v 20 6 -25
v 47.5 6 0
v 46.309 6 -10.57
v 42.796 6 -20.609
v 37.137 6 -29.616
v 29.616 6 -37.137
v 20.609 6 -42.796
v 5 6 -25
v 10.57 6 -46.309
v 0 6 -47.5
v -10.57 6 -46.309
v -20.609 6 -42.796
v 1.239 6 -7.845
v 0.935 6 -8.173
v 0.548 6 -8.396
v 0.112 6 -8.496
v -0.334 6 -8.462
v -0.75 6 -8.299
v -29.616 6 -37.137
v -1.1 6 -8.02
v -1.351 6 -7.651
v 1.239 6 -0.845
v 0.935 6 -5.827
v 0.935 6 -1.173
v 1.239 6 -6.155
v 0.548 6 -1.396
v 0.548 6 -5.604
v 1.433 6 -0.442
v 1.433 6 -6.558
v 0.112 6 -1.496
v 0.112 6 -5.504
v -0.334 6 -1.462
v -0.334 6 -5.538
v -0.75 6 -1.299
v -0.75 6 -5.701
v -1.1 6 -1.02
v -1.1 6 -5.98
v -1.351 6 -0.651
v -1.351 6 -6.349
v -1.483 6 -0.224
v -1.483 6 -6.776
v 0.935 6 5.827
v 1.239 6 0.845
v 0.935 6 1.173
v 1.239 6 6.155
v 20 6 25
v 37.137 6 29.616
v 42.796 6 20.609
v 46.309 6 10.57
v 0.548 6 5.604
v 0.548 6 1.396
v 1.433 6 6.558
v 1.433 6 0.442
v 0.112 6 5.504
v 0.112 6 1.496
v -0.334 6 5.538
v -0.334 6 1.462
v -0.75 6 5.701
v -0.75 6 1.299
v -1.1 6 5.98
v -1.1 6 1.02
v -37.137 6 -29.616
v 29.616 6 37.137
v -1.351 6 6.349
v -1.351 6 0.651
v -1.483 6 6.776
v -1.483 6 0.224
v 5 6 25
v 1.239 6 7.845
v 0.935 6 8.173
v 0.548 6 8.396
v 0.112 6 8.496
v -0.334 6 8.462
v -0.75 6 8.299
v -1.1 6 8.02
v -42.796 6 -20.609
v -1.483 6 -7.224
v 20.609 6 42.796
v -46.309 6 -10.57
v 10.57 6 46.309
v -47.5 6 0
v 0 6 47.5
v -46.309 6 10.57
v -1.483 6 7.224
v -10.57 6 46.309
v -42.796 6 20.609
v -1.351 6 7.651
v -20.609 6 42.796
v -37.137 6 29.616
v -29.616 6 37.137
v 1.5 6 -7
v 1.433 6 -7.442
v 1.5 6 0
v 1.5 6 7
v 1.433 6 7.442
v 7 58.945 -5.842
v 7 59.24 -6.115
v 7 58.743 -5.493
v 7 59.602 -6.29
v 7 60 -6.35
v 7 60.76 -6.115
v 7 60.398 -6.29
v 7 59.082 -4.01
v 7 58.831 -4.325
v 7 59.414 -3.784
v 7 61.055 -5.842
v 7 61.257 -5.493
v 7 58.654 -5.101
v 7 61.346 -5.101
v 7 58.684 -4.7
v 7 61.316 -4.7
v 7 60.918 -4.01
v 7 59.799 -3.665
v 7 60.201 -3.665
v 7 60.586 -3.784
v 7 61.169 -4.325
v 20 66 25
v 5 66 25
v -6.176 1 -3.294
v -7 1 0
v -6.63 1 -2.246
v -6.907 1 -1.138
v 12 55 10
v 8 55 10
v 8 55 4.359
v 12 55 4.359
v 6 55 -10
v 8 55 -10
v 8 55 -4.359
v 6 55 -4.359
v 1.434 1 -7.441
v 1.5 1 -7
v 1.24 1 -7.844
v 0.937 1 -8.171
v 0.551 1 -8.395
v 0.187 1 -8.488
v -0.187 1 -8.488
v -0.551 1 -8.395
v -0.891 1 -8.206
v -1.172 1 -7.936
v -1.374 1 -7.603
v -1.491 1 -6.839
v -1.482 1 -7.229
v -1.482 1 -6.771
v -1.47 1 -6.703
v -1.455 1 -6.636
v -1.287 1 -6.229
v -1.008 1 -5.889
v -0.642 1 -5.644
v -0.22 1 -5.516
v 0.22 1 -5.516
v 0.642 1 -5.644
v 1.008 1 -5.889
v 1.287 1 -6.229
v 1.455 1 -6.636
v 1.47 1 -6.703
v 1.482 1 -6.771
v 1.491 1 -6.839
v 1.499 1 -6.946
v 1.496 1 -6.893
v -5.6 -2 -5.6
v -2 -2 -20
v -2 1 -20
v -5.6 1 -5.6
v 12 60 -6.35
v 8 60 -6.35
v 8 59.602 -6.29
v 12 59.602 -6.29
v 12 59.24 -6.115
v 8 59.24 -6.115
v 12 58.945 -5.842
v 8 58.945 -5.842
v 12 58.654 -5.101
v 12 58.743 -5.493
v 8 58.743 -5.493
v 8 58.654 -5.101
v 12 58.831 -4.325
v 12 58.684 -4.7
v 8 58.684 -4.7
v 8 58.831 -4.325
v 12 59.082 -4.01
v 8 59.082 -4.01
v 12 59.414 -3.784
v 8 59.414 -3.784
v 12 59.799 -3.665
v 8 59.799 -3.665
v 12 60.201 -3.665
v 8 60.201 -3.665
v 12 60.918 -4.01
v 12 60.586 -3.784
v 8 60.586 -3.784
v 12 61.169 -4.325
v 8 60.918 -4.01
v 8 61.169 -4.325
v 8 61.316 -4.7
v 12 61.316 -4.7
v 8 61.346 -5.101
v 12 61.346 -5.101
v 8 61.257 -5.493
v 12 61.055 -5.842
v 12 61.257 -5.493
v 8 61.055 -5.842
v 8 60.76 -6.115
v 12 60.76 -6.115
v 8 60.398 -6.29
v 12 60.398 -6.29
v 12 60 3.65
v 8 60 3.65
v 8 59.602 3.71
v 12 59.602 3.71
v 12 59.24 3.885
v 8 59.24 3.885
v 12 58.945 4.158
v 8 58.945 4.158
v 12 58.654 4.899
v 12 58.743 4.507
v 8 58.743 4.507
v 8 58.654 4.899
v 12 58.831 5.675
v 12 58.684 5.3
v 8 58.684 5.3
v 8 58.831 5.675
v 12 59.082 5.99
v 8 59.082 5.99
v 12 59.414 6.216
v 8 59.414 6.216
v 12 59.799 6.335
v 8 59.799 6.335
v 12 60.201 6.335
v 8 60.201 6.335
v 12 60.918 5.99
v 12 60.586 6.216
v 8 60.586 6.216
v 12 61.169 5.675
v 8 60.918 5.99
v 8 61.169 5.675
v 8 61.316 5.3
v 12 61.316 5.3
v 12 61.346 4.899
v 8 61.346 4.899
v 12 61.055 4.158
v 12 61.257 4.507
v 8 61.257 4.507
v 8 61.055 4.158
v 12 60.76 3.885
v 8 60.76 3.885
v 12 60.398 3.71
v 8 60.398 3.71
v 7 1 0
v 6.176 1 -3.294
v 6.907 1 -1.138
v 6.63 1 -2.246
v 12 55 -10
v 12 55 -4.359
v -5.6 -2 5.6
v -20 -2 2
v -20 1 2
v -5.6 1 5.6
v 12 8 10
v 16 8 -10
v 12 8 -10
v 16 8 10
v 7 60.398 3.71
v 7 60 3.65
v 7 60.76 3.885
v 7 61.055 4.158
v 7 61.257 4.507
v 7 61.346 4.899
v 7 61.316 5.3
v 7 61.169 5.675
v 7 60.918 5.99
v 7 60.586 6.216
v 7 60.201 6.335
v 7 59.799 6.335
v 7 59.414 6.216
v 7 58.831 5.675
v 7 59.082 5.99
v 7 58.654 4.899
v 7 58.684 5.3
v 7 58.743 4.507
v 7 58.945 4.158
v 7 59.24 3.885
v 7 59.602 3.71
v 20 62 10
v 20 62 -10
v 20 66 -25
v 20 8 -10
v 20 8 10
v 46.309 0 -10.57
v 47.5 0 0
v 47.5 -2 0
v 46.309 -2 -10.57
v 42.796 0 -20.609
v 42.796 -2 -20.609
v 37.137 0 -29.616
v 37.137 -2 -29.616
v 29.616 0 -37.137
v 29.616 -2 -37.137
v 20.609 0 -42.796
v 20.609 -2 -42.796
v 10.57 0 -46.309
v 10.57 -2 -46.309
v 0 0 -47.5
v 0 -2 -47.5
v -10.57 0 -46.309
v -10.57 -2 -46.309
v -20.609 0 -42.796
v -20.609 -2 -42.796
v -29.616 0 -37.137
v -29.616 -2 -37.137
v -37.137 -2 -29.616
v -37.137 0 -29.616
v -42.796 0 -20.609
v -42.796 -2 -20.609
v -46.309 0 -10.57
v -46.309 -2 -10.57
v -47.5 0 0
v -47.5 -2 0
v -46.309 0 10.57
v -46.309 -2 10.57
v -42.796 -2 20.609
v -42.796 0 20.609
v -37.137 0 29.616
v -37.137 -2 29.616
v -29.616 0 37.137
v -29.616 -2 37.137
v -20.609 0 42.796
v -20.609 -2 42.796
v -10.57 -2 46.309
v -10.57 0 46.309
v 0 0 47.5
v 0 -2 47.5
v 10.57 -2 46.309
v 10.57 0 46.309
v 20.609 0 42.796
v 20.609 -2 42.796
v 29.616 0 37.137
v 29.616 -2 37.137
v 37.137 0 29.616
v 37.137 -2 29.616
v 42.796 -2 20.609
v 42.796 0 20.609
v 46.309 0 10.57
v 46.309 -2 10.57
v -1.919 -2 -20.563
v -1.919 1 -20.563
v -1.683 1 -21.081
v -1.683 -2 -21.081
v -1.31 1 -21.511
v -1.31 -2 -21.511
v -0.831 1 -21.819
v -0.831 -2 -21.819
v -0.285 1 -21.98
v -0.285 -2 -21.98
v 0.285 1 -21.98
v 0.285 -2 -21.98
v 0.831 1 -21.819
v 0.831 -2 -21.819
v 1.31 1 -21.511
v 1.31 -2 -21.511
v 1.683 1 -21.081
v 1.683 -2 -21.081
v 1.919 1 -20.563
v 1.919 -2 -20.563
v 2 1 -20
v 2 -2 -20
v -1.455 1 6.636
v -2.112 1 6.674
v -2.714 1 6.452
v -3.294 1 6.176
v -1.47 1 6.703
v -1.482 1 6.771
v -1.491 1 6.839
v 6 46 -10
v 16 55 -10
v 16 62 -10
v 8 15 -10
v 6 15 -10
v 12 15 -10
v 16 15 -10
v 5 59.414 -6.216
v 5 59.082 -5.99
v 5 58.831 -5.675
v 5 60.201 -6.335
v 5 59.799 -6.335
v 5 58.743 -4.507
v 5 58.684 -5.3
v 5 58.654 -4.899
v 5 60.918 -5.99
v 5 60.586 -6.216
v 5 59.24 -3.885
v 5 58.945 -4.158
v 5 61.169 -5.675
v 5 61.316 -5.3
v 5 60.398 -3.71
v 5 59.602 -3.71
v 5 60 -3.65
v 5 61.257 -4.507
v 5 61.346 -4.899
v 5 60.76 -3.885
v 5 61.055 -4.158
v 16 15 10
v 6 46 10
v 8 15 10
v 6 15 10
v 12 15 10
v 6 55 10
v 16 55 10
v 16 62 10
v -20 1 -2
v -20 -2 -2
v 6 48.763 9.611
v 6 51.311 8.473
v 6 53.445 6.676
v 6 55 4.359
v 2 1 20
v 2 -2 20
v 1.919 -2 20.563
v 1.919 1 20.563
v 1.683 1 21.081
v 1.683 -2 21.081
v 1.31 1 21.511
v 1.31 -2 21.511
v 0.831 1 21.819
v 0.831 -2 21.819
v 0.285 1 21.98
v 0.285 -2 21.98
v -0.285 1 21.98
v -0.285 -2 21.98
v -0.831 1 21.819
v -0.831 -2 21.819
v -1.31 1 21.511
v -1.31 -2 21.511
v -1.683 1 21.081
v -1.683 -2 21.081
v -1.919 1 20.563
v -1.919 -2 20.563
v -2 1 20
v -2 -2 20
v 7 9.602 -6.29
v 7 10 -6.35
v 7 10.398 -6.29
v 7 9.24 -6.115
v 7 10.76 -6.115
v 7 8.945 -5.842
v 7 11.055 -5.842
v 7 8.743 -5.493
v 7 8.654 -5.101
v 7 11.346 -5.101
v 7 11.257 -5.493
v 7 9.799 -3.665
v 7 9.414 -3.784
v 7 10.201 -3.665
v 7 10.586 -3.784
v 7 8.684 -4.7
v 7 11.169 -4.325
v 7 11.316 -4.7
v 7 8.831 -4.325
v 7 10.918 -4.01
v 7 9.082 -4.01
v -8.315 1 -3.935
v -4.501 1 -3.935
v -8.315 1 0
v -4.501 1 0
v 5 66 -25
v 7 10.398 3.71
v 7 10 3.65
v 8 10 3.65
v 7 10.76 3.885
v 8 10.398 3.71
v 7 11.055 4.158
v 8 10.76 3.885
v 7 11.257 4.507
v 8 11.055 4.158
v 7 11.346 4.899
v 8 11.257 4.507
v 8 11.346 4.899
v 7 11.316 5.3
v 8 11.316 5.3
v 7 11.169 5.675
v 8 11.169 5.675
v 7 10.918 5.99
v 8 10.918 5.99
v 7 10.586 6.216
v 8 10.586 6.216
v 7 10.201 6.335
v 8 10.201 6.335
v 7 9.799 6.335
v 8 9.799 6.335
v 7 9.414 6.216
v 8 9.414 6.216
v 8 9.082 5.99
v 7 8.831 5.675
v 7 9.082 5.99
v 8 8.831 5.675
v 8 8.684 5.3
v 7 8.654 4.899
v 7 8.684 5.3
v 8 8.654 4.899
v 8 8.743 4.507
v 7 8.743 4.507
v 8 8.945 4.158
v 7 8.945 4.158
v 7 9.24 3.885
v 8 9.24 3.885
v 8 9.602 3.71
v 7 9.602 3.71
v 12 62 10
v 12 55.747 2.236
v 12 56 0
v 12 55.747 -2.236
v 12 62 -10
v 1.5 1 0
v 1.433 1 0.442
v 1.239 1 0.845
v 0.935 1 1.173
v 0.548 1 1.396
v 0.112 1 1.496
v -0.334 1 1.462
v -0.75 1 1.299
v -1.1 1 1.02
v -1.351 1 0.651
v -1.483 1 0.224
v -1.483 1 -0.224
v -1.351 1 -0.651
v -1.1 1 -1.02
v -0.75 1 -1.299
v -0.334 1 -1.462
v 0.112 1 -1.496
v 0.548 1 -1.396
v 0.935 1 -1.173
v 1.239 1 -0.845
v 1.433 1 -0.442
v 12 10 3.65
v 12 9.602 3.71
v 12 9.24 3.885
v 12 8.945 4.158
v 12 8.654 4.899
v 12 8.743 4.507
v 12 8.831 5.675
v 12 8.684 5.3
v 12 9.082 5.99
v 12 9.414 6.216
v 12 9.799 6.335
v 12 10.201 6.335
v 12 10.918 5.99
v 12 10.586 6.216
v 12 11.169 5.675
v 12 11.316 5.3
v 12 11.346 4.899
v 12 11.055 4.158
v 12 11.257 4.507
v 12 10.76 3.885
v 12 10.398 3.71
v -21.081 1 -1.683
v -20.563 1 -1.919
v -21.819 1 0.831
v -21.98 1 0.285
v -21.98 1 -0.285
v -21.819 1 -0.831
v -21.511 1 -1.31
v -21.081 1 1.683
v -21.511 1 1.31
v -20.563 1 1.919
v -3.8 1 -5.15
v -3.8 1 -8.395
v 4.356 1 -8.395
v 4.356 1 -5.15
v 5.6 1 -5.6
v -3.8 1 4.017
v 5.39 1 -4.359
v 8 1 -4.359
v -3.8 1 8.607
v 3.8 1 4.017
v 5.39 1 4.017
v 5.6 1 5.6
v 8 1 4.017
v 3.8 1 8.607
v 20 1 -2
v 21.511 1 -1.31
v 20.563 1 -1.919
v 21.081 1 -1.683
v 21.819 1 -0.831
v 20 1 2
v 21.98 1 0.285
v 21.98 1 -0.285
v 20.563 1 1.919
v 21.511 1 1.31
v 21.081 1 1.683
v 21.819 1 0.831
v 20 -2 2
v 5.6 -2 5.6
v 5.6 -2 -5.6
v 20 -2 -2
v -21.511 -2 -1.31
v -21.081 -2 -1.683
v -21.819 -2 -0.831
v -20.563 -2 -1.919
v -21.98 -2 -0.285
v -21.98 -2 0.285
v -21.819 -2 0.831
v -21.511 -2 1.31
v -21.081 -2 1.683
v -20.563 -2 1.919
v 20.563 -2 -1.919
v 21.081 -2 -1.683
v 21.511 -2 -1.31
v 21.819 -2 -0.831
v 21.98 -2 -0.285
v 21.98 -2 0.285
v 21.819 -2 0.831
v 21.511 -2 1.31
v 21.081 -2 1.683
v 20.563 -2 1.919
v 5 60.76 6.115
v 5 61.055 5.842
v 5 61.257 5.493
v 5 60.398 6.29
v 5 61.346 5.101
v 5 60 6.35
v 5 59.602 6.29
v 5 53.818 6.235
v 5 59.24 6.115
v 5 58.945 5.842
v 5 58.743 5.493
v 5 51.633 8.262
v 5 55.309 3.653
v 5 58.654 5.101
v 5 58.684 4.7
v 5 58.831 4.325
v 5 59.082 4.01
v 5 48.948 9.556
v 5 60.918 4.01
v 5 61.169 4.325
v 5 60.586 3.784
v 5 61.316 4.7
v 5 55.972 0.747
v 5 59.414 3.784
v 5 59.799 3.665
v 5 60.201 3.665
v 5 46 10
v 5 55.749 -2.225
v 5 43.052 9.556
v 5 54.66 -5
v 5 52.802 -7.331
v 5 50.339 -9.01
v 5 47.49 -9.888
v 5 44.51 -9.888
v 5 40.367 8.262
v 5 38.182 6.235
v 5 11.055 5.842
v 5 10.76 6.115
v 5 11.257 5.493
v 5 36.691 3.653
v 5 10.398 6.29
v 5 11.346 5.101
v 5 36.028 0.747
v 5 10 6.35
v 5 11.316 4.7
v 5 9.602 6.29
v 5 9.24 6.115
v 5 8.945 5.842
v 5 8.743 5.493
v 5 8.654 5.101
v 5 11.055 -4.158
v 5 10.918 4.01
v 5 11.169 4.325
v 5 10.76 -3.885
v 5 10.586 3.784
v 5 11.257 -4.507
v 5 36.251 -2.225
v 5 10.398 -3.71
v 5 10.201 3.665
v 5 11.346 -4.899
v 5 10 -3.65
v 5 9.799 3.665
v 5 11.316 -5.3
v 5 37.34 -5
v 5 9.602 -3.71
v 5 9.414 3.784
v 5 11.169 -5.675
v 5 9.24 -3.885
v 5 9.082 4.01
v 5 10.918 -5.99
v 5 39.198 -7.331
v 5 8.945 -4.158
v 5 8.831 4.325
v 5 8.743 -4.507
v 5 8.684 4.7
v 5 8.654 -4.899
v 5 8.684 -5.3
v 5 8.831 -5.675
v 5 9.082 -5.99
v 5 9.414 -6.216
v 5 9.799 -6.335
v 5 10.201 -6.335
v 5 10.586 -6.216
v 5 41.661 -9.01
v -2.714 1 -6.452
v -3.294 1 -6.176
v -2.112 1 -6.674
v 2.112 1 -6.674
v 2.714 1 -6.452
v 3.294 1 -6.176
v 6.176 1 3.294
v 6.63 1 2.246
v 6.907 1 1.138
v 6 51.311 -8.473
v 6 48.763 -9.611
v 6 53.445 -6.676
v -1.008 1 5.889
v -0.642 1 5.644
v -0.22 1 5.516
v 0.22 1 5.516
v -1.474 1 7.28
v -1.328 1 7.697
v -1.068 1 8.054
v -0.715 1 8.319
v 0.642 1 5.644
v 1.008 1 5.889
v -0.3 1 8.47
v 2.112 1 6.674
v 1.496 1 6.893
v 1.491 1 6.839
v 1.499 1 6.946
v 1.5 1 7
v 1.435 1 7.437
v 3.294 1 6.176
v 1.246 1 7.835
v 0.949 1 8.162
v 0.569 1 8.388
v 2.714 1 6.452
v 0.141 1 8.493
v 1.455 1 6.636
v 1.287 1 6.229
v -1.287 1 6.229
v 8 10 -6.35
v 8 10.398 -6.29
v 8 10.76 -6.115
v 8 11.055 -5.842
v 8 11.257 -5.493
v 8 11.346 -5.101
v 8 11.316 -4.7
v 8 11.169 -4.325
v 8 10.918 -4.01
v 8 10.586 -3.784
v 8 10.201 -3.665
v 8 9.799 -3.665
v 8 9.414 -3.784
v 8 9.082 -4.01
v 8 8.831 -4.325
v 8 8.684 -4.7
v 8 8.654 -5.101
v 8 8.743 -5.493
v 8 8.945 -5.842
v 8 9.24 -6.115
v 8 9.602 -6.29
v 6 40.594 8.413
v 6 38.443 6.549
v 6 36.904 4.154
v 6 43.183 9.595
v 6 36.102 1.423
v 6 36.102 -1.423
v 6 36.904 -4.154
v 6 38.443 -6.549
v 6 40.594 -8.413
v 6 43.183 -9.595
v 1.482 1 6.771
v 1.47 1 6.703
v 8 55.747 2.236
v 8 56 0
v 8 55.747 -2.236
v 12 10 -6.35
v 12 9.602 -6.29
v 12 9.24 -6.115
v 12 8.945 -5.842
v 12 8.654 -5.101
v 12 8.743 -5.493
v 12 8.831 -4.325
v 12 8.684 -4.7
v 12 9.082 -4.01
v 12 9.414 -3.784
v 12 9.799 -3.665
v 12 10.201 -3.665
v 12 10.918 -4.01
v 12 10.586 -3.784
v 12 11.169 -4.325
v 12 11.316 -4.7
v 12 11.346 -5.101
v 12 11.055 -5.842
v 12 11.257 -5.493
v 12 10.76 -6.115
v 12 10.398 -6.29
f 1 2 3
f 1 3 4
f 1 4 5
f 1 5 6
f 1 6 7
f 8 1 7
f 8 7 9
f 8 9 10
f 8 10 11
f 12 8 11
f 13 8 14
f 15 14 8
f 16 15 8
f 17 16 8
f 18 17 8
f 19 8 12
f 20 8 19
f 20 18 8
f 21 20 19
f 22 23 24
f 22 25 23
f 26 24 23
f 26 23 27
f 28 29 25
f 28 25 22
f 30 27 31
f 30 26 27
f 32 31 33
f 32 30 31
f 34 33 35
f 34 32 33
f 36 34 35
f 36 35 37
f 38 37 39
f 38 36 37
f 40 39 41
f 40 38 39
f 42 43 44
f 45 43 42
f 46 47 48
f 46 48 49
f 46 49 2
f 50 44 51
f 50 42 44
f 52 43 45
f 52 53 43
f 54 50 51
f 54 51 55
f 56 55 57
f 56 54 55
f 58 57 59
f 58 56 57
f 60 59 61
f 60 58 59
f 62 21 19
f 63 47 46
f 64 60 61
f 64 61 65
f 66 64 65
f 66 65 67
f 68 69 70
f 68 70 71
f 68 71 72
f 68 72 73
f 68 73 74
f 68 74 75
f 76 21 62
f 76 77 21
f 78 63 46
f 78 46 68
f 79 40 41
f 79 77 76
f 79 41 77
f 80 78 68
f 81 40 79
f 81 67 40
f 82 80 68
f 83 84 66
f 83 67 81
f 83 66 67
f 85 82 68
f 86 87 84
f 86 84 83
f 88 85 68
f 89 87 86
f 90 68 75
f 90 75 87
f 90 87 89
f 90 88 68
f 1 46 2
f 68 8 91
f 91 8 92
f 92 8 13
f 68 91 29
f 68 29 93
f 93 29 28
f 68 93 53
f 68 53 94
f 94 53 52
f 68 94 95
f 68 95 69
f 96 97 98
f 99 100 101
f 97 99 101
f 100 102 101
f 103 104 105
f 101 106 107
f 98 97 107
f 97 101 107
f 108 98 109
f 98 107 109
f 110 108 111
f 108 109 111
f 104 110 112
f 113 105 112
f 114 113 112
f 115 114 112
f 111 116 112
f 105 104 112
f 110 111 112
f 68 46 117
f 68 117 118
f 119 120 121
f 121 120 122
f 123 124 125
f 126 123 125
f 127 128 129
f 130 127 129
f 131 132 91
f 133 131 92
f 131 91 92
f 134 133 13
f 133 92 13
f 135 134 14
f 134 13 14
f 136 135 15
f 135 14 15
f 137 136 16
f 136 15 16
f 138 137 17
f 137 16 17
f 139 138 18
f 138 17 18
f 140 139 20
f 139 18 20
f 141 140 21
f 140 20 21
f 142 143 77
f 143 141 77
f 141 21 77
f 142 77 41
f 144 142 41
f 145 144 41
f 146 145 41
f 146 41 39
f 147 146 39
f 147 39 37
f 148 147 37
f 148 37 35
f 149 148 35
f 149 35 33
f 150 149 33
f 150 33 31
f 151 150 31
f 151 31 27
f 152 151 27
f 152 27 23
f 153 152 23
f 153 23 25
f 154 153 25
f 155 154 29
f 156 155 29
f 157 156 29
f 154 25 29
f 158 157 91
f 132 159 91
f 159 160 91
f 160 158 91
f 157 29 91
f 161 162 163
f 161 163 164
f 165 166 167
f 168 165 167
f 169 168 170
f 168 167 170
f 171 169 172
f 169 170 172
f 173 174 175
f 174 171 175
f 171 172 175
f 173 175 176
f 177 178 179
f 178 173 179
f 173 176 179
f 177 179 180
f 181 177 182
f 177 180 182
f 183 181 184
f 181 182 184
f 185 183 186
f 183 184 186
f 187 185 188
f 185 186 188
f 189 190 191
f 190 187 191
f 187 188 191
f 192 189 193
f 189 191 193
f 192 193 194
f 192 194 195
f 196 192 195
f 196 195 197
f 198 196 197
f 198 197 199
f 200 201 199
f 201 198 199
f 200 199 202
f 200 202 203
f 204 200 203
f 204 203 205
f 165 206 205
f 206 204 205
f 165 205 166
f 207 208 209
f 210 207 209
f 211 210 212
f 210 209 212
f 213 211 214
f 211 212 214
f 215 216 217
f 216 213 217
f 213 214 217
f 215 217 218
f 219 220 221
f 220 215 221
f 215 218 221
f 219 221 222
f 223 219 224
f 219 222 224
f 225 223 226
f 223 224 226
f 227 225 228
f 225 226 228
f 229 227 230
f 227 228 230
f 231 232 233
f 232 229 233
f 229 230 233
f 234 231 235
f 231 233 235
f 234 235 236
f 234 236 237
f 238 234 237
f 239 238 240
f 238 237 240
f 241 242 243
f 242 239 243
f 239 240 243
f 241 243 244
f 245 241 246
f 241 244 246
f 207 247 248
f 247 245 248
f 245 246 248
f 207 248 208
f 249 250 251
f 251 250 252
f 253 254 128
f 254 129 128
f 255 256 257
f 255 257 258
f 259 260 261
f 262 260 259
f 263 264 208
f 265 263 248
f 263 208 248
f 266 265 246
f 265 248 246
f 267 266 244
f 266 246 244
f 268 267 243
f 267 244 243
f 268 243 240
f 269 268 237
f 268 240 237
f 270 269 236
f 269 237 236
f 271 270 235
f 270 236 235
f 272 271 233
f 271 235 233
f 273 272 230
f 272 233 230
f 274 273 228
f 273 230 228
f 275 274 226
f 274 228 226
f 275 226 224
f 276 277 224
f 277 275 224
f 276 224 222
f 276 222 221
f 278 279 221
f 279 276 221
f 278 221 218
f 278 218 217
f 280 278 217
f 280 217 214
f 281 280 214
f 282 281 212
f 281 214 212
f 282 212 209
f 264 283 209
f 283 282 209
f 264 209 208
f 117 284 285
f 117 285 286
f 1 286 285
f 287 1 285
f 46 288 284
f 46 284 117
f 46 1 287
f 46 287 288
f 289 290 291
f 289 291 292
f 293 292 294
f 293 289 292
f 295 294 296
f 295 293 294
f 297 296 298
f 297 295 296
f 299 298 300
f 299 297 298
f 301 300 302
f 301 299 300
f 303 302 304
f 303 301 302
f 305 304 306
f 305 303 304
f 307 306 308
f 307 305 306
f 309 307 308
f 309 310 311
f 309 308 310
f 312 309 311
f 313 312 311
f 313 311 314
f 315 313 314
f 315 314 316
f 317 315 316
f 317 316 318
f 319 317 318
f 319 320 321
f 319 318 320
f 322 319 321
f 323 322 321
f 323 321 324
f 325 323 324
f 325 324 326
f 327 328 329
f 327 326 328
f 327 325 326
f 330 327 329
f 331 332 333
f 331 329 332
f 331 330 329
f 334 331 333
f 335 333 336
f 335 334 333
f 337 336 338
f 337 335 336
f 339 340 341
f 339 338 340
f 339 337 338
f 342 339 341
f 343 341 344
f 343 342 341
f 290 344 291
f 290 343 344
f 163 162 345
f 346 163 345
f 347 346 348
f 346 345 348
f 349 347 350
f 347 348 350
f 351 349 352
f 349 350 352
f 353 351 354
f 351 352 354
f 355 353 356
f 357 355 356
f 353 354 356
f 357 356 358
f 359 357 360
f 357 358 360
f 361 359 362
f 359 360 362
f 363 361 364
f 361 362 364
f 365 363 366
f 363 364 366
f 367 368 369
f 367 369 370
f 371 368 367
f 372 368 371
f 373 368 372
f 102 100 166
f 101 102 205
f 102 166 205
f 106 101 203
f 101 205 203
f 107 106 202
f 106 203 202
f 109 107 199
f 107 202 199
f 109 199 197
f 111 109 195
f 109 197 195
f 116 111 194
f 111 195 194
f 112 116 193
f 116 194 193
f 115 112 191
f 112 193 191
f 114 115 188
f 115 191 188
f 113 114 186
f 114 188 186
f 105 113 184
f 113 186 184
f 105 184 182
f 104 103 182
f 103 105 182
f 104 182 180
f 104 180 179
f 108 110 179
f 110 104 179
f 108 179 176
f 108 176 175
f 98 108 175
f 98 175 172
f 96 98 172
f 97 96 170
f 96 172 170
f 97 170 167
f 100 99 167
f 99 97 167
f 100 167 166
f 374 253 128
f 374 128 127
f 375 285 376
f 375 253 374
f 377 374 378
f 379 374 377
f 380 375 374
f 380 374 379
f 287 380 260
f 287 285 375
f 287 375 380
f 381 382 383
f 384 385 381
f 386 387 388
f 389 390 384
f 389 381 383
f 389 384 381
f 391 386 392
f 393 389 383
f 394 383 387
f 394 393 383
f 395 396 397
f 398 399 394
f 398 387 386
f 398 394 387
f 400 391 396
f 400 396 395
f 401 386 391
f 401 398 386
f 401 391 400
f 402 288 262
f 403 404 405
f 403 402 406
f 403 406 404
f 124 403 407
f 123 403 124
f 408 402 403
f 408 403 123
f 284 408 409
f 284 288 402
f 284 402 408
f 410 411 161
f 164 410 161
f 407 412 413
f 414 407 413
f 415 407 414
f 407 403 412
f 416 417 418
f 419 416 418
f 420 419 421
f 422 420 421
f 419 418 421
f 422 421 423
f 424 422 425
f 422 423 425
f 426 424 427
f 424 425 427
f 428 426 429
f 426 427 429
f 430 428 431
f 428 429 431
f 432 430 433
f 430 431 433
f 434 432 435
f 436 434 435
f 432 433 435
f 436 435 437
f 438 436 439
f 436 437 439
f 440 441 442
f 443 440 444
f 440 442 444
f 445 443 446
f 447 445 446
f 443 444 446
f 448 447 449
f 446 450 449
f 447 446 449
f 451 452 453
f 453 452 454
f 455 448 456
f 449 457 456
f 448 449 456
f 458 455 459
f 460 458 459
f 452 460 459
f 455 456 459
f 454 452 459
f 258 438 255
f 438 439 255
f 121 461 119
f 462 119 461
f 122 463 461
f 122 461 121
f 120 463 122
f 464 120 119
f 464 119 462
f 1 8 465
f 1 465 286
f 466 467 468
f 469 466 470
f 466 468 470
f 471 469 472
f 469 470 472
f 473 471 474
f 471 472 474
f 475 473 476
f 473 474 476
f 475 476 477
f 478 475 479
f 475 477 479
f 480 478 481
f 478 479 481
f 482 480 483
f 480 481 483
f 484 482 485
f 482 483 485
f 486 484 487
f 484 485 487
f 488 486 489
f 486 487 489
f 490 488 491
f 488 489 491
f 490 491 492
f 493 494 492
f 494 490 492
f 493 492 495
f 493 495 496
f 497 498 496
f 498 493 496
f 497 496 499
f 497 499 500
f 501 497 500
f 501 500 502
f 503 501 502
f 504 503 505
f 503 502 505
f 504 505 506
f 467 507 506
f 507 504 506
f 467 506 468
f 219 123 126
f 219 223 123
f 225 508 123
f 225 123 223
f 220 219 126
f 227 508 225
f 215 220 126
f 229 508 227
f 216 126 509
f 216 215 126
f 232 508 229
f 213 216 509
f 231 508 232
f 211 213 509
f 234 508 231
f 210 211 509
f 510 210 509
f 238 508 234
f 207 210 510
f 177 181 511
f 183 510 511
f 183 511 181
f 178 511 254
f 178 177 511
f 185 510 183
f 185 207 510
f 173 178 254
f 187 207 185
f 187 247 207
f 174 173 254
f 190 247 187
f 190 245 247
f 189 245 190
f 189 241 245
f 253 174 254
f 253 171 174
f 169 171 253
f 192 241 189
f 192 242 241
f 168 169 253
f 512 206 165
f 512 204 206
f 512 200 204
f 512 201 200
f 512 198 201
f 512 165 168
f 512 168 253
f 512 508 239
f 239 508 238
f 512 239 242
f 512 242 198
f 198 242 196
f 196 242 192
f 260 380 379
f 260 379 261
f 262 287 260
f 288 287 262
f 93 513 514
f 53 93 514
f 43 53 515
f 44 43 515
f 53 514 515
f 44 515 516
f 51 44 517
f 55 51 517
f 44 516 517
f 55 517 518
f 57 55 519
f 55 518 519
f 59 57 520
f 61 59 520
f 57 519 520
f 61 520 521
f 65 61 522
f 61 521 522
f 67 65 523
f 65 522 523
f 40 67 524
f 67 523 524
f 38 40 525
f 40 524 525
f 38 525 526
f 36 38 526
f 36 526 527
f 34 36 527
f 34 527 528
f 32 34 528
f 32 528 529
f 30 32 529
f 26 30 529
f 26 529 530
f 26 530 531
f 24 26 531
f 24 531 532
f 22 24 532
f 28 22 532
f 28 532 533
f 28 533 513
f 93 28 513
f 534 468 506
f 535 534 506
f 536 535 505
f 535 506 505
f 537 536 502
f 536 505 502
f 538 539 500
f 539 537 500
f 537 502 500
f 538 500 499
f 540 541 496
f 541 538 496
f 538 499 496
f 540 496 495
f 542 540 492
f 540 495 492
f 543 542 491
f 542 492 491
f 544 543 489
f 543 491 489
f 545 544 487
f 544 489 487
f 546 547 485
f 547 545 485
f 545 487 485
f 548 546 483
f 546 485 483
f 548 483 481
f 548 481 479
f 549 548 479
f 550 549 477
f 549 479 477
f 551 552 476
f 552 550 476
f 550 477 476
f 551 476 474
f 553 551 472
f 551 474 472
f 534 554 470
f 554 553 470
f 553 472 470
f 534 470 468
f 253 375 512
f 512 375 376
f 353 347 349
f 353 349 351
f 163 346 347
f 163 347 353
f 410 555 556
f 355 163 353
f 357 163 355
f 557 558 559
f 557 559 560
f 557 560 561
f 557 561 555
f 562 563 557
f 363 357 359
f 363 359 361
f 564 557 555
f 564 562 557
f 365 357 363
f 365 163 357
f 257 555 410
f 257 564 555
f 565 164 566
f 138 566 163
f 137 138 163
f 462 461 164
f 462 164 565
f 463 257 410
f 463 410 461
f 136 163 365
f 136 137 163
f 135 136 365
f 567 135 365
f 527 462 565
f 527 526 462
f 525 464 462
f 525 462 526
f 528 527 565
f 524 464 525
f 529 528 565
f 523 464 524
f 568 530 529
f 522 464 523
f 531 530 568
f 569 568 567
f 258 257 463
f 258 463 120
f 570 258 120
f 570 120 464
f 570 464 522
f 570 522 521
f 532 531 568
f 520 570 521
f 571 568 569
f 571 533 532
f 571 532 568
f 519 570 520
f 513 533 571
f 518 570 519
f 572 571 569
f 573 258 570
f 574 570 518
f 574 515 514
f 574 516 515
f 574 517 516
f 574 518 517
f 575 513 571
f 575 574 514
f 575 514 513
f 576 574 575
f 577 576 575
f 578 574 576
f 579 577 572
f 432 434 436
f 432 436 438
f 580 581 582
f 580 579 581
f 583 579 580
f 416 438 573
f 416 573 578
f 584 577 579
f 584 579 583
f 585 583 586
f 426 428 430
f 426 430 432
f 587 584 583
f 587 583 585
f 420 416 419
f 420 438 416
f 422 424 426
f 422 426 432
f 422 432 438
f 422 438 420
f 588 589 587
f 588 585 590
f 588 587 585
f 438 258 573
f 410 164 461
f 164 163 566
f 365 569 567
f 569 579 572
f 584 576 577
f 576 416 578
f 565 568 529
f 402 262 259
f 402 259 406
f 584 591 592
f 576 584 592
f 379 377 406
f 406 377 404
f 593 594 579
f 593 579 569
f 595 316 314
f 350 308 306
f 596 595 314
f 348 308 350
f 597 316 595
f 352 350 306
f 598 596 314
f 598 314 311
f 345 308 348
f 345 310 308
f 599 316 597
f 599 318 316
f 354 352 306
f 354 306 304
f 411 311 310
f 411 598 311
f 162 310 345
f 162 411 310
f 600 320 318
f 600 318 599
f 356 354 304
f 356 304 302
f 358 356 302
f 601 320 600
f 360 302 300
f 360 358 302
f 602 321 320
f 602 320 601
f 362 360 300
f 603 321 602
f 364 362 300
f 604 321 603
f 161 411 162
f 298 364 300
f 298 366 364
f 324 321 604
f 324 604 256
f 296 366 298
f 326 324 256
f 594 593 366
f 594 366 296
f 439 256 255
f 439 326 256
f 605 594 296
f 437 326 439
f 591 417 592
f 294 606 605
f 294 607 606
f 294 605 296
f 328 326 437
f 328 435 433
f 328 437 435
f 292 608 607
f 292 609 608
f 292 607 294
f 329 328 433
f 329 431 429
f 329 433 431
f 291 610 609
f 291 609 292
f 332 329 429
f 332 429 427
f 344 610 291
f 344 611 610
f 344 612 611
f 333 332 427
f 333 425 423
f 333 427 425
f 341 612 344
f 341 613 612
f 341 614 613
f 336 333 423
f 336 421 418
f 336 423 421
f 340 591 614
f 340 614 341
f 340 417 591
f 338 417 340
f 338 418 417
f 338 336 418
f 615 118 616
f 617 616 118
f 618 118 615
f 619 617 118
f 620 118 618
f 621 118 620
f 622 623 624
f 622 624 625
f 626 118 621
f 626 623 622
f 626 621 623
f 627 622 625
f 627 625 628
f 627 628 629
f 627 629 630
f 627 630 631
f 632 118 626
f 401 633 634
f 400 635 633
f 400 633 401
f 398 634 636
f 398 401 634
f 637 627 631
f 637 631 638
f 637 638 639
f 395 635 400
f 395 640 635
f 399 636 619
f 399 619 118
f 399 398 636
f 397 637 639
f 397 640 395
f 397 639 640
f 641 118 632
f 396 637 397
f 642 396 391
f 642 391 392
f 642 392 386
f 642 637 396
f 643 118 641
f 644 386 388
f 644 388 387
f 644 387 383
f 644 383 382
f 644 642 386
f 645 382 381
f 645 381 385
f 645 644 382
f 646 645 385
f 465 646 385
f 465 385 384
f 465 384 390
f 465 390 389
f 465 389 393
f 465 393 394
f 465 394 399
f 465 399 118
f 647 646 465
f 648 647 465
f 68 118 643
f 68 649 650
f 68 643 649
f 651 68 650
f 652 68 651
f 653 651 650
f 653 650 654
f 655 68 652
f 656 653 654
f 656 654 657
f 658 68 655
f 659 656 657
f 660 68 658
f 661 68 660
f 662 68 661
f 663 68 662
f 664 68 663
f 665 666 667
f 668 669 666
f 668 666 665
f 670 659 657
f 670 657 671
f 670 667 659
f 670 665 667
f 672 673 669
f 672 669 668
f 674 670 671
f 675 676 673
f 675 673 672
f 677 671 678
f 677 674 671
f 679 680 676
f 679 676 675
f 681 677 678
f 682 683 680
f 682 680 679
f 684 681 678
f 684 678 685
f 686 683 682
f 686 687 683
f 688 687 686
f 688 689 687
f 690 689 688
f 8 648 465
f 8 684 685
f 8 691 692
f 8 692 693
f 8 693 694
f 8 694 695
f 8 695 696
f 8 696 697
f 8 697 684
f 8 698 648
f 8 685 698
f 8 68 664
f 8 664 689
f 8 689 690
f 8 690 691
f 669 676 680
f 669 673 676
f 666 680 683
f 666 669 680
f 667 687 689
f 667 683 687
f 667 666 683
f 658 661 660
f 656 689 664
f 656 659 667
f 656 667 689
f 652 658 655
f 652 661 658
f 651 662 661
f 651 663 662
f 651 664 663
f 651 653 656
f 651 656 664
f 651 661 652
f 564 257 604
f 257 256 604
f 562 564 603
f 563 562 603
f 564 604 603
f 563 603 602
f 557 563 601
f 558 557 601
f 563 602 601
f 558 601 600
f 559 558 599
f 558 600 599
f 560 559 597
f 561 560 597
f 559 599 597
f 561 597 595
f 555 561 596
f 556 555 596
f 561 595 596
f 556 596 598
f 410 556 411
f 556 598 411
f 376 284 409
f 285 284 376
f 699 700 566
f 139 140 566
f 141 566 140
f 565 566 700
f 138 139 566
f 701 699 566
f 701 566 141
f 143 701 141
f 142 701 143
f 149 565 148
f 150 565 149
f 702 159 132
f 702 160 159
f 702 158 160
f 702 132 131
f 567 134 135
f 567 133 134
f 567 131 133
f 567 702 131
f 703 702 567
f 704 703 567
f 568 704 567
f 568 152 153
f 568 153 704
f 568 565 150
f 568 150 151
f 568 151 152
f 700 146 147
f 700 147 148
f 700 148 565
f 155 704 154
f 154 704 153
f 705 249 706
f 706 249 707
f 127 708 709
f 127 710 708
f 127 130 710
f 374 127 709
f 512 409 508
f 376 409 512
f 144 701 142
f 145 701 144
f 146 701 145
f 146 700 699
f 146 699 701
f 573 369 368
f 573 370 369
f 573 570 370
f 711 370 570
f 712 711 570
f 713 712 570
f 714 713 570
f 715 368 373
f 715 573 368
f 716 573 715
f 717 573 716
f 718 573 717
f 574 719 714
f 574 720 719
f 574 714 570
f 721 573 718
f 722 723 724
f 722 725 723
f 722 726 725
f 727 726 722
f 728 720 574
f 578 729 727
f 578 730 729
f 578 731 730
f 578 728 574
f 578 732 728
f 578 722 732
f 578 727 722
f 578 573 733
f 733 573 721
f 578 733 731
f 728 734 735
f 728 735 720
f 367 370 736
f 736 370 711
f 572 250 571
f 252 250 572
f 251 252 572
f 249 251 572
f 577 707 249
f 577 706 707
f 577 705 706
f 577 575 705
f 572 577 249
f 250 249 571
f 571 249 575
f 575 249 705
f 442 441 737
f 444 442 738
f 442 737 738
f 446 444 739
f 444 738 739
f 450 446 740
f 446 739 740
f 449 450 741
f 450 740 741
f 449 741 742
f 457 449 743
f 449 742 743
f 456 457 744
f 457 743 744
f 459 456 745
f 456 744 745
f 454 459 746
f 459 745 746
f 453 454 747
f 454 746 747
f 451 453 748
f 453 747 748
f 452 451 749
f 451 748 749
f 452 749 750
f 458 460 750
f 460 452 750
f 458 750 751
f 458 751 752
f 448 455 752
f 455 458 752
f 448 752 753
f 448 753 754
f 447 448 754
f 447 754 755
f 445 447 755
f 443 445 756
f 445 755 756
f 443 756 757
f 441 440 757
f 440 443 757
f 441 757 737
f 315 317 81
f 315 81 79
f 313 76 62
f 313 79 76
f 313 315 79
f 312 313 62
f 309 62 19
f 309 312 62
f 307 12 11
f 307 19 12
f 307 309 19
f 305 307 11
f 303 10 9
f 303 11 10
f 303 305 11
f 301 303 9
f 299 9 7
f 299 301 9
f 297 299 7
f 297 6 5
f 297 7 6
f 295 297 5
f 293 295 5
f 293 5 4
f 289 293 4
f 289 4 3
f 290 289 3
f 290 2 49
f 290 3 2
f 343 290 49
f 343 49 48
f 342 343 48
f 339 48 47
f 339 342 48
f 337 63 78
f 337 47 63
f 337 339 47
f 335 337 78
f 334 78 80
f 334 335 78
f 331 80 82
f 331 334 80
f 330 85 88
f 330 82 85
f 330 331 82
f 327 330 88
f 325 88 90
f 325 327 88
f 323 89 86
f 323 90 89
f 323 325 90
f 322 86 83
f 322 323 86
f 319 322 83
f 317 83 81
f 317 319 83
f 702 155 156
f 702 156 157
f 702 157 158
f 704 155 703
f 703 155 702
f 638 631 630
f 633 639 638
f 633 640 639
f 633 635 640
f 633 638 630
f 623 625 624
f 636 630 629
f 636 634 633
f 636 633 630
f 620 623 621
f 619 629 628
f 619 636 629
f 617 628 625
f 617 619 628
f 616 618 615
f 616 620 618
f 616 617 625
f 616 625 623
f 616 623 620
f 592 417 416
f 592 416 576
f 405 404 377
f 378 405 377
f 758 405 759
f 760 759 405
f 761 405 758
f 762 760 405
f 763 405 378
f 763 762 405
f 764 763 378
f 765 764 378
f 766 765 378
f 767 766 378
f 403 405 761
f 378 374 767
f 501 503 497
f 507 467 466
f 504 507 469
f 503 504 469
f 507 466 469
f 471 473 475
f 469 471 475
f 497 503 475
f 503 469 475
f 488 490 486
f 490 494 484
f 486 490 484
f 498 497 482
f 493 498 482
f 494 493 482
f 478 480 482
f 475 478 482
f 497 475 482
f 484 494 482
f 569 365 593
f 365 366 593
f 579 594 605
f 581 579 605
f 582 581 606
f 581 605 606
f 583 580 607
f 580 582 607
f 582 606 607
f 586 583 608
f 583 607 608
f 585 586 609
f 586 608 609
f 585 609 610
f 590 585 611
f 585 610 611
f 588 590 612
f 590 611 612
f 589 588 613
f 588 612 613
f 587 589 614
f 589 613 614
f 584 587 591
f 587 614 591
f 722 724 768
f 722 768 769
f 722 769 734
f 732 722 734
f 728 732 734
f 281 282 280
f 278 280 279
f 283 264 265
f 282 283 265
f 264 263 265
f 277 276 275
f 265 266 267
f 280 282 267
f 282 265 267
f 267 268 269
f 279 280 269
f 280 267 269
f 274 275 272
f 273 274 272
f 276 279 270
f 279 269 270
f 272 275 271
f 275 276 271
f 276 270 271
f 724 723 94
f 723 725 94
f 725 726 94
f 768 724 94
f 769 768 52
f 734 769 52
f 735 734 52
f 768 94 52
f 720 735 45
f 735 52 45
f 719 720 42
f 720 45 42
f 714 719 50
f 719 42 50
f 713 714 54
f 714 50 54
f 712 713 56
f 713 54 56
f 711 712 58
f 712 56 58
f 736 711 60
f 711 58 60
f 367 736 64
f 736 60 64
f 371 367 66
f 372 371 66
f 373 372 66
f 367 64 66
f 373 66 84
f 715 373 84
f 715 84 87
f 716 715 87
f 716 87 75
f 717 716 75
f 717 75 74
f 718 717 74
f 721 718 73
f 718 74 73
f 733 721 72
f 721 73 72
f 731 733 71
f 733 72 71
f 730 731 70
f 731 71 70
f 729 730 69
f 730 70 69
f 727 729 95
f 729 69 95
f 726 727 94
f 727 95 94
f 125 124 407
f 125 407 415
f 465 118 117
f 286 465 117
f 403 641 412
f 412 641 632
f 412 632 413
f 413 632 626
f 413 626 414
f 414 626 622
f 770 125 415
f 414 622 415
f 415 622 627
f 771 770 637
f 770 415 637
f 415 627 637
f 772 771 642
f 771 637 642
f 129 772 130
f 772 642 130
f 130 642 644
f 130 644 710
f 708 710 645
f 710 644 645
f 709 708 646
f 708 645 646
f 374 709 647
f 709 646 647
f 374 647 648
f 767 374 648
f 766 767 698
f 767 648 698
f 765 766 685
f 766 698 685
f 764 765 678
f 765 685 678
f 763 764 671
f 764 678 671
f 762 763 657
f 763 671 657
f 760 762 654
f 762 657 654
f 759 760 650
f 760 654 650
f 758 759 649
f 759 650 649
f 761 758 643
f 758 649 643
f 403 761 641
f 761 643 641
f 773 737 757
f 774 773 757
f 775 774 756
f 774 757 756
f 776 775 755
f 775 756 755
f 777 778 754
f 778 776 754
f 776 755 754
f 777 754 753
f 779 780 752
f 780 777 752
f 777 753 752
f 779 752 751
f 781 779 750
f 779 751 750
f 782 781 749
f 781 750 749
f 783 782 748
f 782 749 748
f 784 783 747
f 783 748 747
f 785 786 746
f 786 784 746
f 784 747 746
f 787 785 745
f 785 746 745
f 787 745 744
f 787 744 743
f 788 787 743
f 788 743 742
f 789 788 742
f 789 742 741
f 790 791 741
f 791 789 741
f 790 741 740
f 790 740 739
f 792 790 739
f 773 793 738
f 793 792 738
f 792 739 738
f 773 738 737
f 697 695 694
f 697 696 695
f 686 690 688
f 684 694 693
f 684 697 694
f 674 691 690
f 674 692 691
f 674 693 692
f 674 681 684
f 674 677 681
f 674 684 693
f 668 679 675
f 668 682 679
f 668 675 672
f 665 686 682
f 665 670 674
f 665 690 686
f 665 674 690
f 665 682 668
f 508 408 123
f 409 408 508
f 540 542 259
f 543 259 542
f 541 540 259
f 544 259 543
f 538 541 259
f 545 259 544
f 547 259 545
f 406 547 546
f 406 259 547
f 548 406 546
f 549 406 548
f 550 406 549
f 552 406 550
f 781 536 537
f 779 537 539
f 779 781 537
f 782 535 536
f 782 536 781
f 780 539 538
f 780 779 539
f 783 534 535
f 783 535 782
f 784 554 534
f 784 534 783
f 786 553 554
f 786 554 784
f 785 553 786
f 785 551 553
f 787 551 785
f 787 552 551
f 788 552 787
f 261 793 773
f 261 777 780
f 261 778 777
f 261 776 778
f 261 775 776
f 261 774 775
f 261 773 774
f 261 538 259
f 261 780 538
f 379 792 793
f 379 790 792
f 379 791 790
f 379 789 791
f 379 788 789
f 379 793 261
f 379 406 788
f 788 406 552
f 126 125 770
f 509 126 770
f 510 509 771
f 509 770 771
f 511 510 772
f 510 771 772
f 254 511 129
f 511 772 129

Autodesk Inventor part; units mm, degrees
ref_plane "YZ Plane" through (0, 0, 0) normal (1, 0, 0) x (0, 1, 0)
ref_plane "XZ Plane" through (0, 0, 0) normal (0, 1, 0) x (-1, 0, 0)
ref_plane "XY Plane" through (0, 0, 0) normal (0, 0, 1) x (1, 0, 0)
sketch "Sketch1" plane through (0, 0, 0) normal (0, 1, 0) x (-1, 0, 0)
  circle A0 centre (0, 0) radius 47.5
  dimension "d0" = 95
extrude "Extrusion1" add sketch "Sketch1" along normal blind 6
sketch "Sketch2" plane through (0, 6, 0) normal (0, 1, 0) x (1, 0, 0)
  circle A0 centre (0, 0) radius 7
  circle A1 centre (0, -7) radius 1.5
  circle A2 centre (0, 7) radius 1.5
  dimension "d3" = 14
  dimension "d4" = 3
  dimension "d5" = 3
extrude "Extrusion2" cut sketch "Sketch2" against normal blind 6 contours A2 A0 | A0 A2 | A1 A0 | A0 A1
sketch "Sketch3" plane through (0, 6, 0) normal (0, 1, 0) x (1, 0, 0)
  line L0 (0, 0) -> (5, 0)
  line L1 (5, 0) -> (5, -10)
  line L2 (5, -10) -> (0, -10)
  line L3 (0, -10) -> (0, 0)
  line L4 (5, 0) -> (0, 0)
  line L5 (0, 0) -> (0, 10)
  line L6 (0, 10) -> (5, 10)
  line L7 (5, 10) -> (5, 0)
  line L8 (5, 0) -> (20, 0)
  line L9 (20, 0) -> (20, -25)
  line L10 (20, -25) -> (5, -25)
  line L11 (5, -25) -> (5, 0)
  line L12 (20, 0) -> (5, 0)
  line L13 (5, 0) -> (5, 25)
  line L14 (5, 25) -> (20, 25)
  line L15 (20, 25) -> (20, 0)
  dimension "d8" = 5
  dimension "d9" = 10
  dimension "d10" = 10
  dimension "d11" = 15
  dimension "d12" = 25
  dimension "d13" = 25
extrude "Extrusion3" add sketch "Sketch3" along normal blind 60 contours L8 L9 L10 L11 L1 | L7 L13 L14 L15 L8
sketch "Sketch4" plane through (5, 6, -25) normal (-1, 0, 0) x (0, 0, 1)
  line L0 (50, 0) -> (50, 60) projected
  line L1 (50, 0) -> (48, 0)
  line L2 (48, 0) -> (48, 40)
  line L3 (48, 40) -> (50, 40)
  line L4 (50, 40) -> (50, 0)
  circle A0 centre (25, 40) radius 10
  point P0 (25, -6)
  dimension "d16" = 2
  dimension "d17" = 40
  dimension "d18" = 20
extrude "Extrusion4" cut sketch "Sketch4" against normal blind 20 contours A0
sketch "Sketch5" plane through (20, 6, 25) normal (1, 0, 0) x (0, 0, -1)
  circle A0 centre (25, 40) radius 10 projected
  line L0 (25, 40) -> (30, 40)
  line L1 (30, 40) -> (30, 4)
  line L2 (30, 4) -> (25, 4)
  line L3 (25, 4) -> (25, 40)
  line L4 (25, 40) -> (20, 40)
  line L5 (20, 40) -> (20, 4)
  line L6 (20, 4) -> (25, 4)
  line L7 (25, 4) -> (25, 40)
  circle A1 centre (20, 4) radius 1.35
  circle A2 centre (30, 4) radius 1.35
  point P0 (25, -6)
  dimension "d21" = 5
  dimension "d22" = 36
  dimension "d23" = 5
  dimension "d24" = 36
  dimension "d25" = 2.7
  dimension "d26" = 2.7
extrude "Extrusion5" cut sketch "Sketch5" against normal blind 20 contours A1 L6 L5 | L5 L6 A1 | A2 L2 L1 | L1 L2 A2
sketch "Sketch6" plane through (20, 6, 25) normal (1, 0, 0) x (0, 0, -1)
  line L0 (25, 40) -> (30, 40)
  line L1 (30, 40) -> (30, 54)
  line L2 (30, 54) -> (25, 54)
  line L3 (25, 54) -> (25, 40)
  line L4 (25, 40) -> (20, 40)
  line L5 (20, 40) -> (20, 54)
  line L6 (20, 54) -> (25, 54)
  line L7 (25, 54) -> (25, 40)
  circle A0 centre (20, 54) radius 1.35
  circle A1 centre (30, 54) radius 1.35
  point P0 (25, -6)
  dimension "d29" = 5
  dimension "d30" = 14
  dimension "d31" = 5
  dimension "d32" = 14
  dimension "d33" = 2.7
  dimension "d34" = 2.7
extrude "Extrusion6" cut sketch "Sketch6" against normal blind 20 contours A1 L2 L1 | L1 L2 A1 | A0 L5 L6 | L6 L5 A0
sketch "Sketch7" plane through (20, 6, 25) normal (1, 0, 0) x (0, 0, -1)
  line L0 (20, 54) -> (30, 54)
  line L1 (30, 54) -> (30, 4)
  line L2 (30, 4) -> (20, 4)
  line L3 (20, 4) -> (20, 54)
  circle A0 centre (20, 54) radius 1.35 projected
  line L4 (0, 0) -> (0, 60) projected
  line L5 (20, 54) -> (0, 54)
  line L6 (0, 54) -> (0, 49)
  line L7 (0, 49) -> (20, 49)
  line L8 (20, 49) -> (20, 54)
  circle A1 centre (25, 40) radius 10 projected
  line L9 (25, 40) -> (15, 40)
  line L10 (15, 40) -> (15, 30)
  line L11 (15, 30) -> (25, 30)
  line L12 (25, 30) -> (25, 40)
  line L13 (25, 40) -> (35, 40)
  line L14 (35, 40) -> (35, 30)
  line L15 (35, 30) -> (25, 30)
  line L16 (25, 30) -> (25, 40)
  line L17 (35, 40) -> (15, 40)
  line L18 (15, 40) -> (15, 9)
  line L19 (15, 9) -> (35, 9)
  line L20 (35, 9) -> (35, 40)
  line L21 (15, 9) -> (35, 9)
  line L22 (35, 9) -> (35, 49)
  line L23 (35, 49) -> (15, 49)
  line L24 (15, 49) -> (15, 9)
  point P0 (25, -6)
  point P1 (30, 49)
  point P2 (30, 48.6603)
  point P3 (15, 49)
  point P4 (20, 48.6603)
  dimension "d37" = 10
  dimension "d38" = 50
  dimension "d39" = 5
  dimension "d40" = 10
  dimension "d41" = 10
  dimension "d42" = 10
  dimension "d43" = 31
  dimension "d44" = 40
extrude "Extrusion7" cut sketch "Sketch7" against normal blind 14 contours L3 A1 L24 L7 | L23 L22 A1 L1 | A1 L3 L11 L10 | L14 L15 L1 A1 | A1 L11 L3 | L11 L3 L19 L18 | L1 L15 A1 | L20 L19 L1 L15 | L11 L15 L1 L19 L3
sketch "Sketch8" plane through (20, 6, 25) normal (1, 0, 0) x (0, 0, -1)
  line L0 (15, 40) -> (15, 49) projected
  line L1 (15, 49) -> (35, 49)
  line L2 (35, 49) -> (35, 56)
  line L3 (35, 56) -> (15, 56)
  line L4 (15, 56) -> (15, 49)
  line L5 (35, 9) -> (15, 9) projected
  line L6 (15, 9) -> (35, 9)
  line L7 (35, 9) -> (35, 2)
  line L8 (35, 2) -> (15, 2)
  line L9 (15, 2) -> (15, 9)
  point P0 (25, -6)
  dimension "d47" = 20
  dimension "d48" = 7
  dimension "d49" = 20
  dimension "d50" = 7
sketch "Sketch9" plane through (20, 6, 25) normal (1, 0, 0) x (0, 0, -1)
  line L0 (15, 40) -> (15, 49) projected
  circle A0 centre (25, 40) radius 10 projected
  line L1 (15, 49) -> (35, 49)
  line L2 (35, 49) -> (35, 40)
  line L3 (35, 40) -> (15, 40)
  line L4 (15, 40) -> (15, 49)
  line L5 (15, 49) -> (20, 49) projected
  line L6 (20, 49) -> (20.777, 49)
  line L7 (20.777, 49) -> (20.777, 48.469)
  line L8 (20.777, 48.469) -> (20, 48.469)
  line L9 (20, 48.469) -> (20, 49)
  line L10 (30, 49) -> (35, 49) projected
  line L11 (30, 49) -> (29.2041, 49)
  line L12 (29.2041, 49) -> (29.2041, 48.469)
  line L13 (29.2041, 48.469) -> (30, 48.469)
  line L14 (30, 48.469) -> (30, 49)
  line L15 (35, 49) -> (35, 9) projected
  line L16 (15, 56) -> (35, 56)
  line L17 (35, 56) -> (35, 49)
  line L18 (35, 49) -> (15, 49)
  line L19 (15, 49) -> (15, 56)
  line L20 (15, 9) -> (15, 49) projected
  line L21 (15, 9) -> (35, 9)
  line L22 (35, 9) -> (35, 2)
  line L23 (35, 2) -> (15, 2)
  line L24 (15, 2) -> (15, 9)
  point P0 (25, -6)
  point P1 (20, 48.6603)
  point P2 (30, 48.6603)
  dimension "d51" = 7
extrude "Extrusion8" cut sketch "Sketch9" against normal blind 12 contours L19 L16 L17 L1 A0 | L9 L1 A0 | L21 L22 L23 L24 | A0 L1 L14
sketch "Sketch10" plane through (8, 60, -5) normal (1, 0, 0) x (0, 0, -1)
  line L0 (-10, -5) -> (-10, -5.3397) projected
  line L1 (-10, -5) -> (0, -5)
  line L2 (0, -5) -> (0, -5.5581)
  line L3 (0, -5.5581) -> (-10, -5.5581)
  line L4 (-10, -5.5581) -> (-10, -5)
  point P0 (-5, -60)
extrude "Extrusion9" cut sketch "Sketch10" against normal blind 2
sketch "Sketch11" plane through (5, 6, -25) normal (-1, 0, 0) x (0, 0, 1)
  point P0 (25, -6)
sketch "Sketch12" plane through (0, 0, 0) normal (0, -1, 0) x (1, 0, 0)
  circle A0 centre (0, 0) radius 1.5
  dimension "d56" = 3
extrude "Extrusion10" cut sketch "Sketch12" against normal blind 13.8125
sketch "Sketch13" plane through (0, 0, 0) normal (0, -1, 0) x (1, 0, 0)
  circle A0 centre (0, 0) radius 1.5 projected
  circle A1 centre (0, 0) radius 47.5
  circle A2 centre (0, 7) radius 1.5 projected
  circle A3 centre (0, 7) radius 1.5
  circle A4 centre (0, 0) radius 1.5
  circle A5 centre (0, -7) radius 1.5 projected
  circle A6 centre (0, -7) radius 1.5
  dimension "d59" = 3
extrude "Extrusion11" add sketch "Sketch13" along normal blind 2
sketch "Sketch14" plane through (0, -2, 0) normal (0, -1, 0) x (1, 0, 0)
  circle A0 centre (0, 0) radius 1.5 projected
  circle A1 centre (0, 0) radius 7
  line L0 (0, 0) -> (0, -20)
  line L1 (0, -20) -> (0, 20)
  line L2 (0, 0) -> (20, 0)
  line L3 (20, 0) -> (-20, 0)
  circle A2 centre (0, 20) radius 2
  circle A3 centre (-20, 0) radius 2
  circle A4 centre (0, -20) radius 2
  circle A5 centre (20, 0) radius 2
  line L4 (2, 20) -> (7, 0)
  line L5 (-2, 20) -> (-7, 0)
  line L6 (20, 25) -> (20, -25) projected
  circle A6 centre (0, 7) radius 1.5 projected
  line L7 (20, 2) -> (0, 7)
  circle A7 centre (0, -7) radius 1.5 projected
  line L8 (20, -2) -> (0, -7)
  line L9 (2, -20) -> (7, 0)
  line L10 (-2, -20) -> (-7, 0)
  line L11 (-20, 2) -> (0, 7)
  line L12 (-20, -2) -> (0, -7)
  point P0 (6.1765, 3.2941)
  point P1 (6.1765, -3.2941)
  point P2 (-6.1765, -3.2941)
  point P3 (3.2941, -6.1765)
  point P4 (1.4914, -6.8393)
  point P5 (-1.4914, -6.8393)
  point P6 (-3.2941, -6.1765)
  point P7 (-1.4552, -6.6362)
  point P8 (1.4552, -6.6362)
  point P9 (3.2941, 6.1765)
  point P10 (1.4552, 6.6362)
  point P11 (-1.4552, 6.6362)
  point P12 (-3.2941, 6.1765)
  point P13 (-1.4914, 6.8393)
  point P14 (1.4914, 6.8393)
  point P15 (5.6, 5.6)
  point P16 (-5.6, 5.6)
  point P17 (-5.6, -5.6)
  point P18 (5.6, -5.6)
  dimension "d62" = 14
  dimension "d63" = 20
  dimension "d64" = 40
  dimension "d65" = 20
  dimension "d66" = 40
  dimension "d67" = 4
  dimension "d68" = 4
  dimension "d69" = 4
  dimension "d70" = 4
extrude "Extrusion12" cut sketch "Sketch14" against normal blind 3 contours L2 L9 A1 L8 A7 L0 A0 | A0 L1 A6 L7 A1 L4 L2 | A0 L3 L5 A1 L11 A6 L1 | L0 A7 L12 A1 L10 L3 A0 | L2 A5 L8 L9 A1 | A1 L4 L7 A5 L2 | A1 L7 L4 | L9 L8 A1 | A5 L6 L2 | L2 L6 A5 | L3 A3 L11 L5 A1 | A1 L10 L12 A3 L3 | A1 L5 | A1 A6 L1 A2 L4 L7 | L8 L9 A4 L0 A7 A1 | L6 A5 | L5 L11 A1 | A1 L12 L10 | A3 | A1 L11 L5 A2 L1 A6 | A7 L0 A4 L10 L12 A1 | A2 | A4
sketch "Sketch16" plane through (0, -2, 0) normal (0, -1, 0) x (1, 0, 0)
  line L0 (-8.315, -3.9346) -> (-4.5008, -3.9346)
  line L1 (-4.5008, -3.9346) -> (-4.5008, 0)
  line L2 (-4.5008, 0) -> (-8.315, 0)
  line L3 (-8.315, 0) -> (-8.315, -3.9346)
  line L4 (-3.8, -5.15) -> (4.3559, -5.15)
  line L5 (4.3559, -5.15) -> (4.3559, -8.3953)
  line L6 (4.3559, -8.3953) -> (-3.8, -8.3953)
  line L7 (-3.8, -8.3953) -> (-3.8, -5.15)
  line L8 (-3.8, 4.0171) -> (3.8, 4.0171)
  line L9 (3.8, 4.0171) -> (3.8, 8.6071)
  line L10 (3.8, 8.6071) -> (-3.8, 8.6071)
  line L11 (-3.8, 8.6071) -> (-3.8, 4.0171)
  line L12 (6, -4.3589) -> (8, -4.3589) projected
  line L13 (5.3903, 4.0171) -> (8, 4.0171)
  line L14 (8, 4.0171) -> (8, -4.3589)
  line L15 (8, -4.3589) -> (5.3903, -4.3589)
  line L16 (5.3903, -4.3589) -> (5.3903, 4.0171)
  point P0 (0, 0)
extrude "Extrusion13" cut sketch "Sketch16" against normal blind 3
sketch "Sketch17" plane through (8, 6, 25) normal (1, 0, 0) x (0, 0, -1)
  point P0 (25, -6)
sketch "Sketch18" plane through (6, 15, 10) normal (0, 0, -1) x (-1, 0, 0)
  point P0 (6, -15)
sketch "Sketch19" plane through (6, 15, 10) normal (0, 1, 0) x (1, 0, 0)
  point P0 (-6, 10)
sketch "Sketch20" plane through (8, 6, 25) normal (1, 0, 0) x (0, 0, -1)
  line L0 (35, 56) -> (35, 2) projected
  line L1 (15, 49) -> (20.6411, 49) projected
  line L2 (35, 56) -> (15, 56)
  line L3 (15, 56) -> (15, 49)
  line L4 (15, 49) -> (35, 49)
  line L5 (35, 49) -> (35, 56)
  circle A0 centre (25, 40) radius 10 projected
  circle A1 centre (25, 40) radius 10
  line L6 (35, 40) -> (35, 9) projected
  line L7 (35, 2) -> (15, 2) projected
  line L8 (35, 9) -> (15, 9)
  line L9 (15, 9) -> (15, 2)
  line L10 (15, 2) -> (35, 2)
  line L11 (35, 2) -> (35, 9)
  circle A2 centre (20, 54) radius 1.35 projected
  circle A3 centre (20, 54) radius 0.875
  circle A4 centre (30, 54) radius 1.35 projected
  circle A5 centre (30, 54) radius 0.875
  circle A6 centre (30, 4) radius 1.35 projected
  circle A7 centre (30, 4) radius 0.875
  circle A8 centre (20, 4) radius 1.35 projected
  circle A9 centre (20, 4) radius 0.875
  point P0 (25, -6)
  point P1 (29.3589, 49)
extrude "Extrusion14" add sketch "Sketch20" along normal blind 8 contours L0 L7 L9 L8 | L0 L4 A0 L1 L3 L2
sketch "Sketch21" plane through (5, 6, -25) normal (-1, 0, 0) x (0, 0, 1)
  circle A0 centre (30, 54) radius 1.35 projected
  circle A1 centre (30, 54) radius 1.35
  circle A2 centre (20, 54) radius 1.35 projected
  circle A3 centre (20, 54) radius 1.35
  circle A4 centre (30, 4) radius 1.35 projected
  circle A5 centre (30, 4) radius 1.35
  circle A6 centre (20, 4) radius 1.35 projected
  circle A7 centre (20, 4) radius 1.35
  point P0 (25, -6)
extrude "Extrusion15" add sketch "Sketch21" against normal blind 2
sketch "Sketch22" plane through (16, 6, 25) normal (1, 0, 0) x (0, 0, -1)
  line L0 (15, 56) -> (35, 56) projected
  line L1 (15, 49) -> (15, 56) projected
  line L2 (35, 56) -> (15, 56)
  line L3 (15, 56) -> (15, 49)
  line L4 (15, 49) -> (35, 49)
  line L5 (35, 49) -> (35, 56)
  arc A0 (35, 40) -> (29.3589, 49) centre (25, 40) ccw projected
  circle A1 centre (25, 40) radius 10
  line L6 (35, 9) -> (15, 9) projected
  line L7 (35, 2) -> (15, 2) projected
  line L8 (15, 9) -> (35, 9)
  line L9 (35, 9) -> (35, 2)
  line L10 (35, 2) -> (15, 2)
  line L11 (15, 2) -> (15, 9)
  circle A2 centre (30, 54) radius 1.35 projected
  circle A3 centre (30, 54) radius 1.35
  circle A4 centre (20, 54) radius 1.35 projected
  circle A5 centre (20, 54) radius 1.35
  circle A6 centre (30, 4) radius 1.35 projected
  circle A7 centre (30, 4) radius 1.35
  circle A8 centre (20, 4) radius 1.35 projected
  circle A9 centre (20, 4) radius 1.35
  point P0 (25, -6)
  point P1 (20.6411, 49)
extrude "Extrusion16" cut sketch "Sketch22" against normal blind 4 contours L0 L5 L4 A1 L1 | L9 L7 L11 L6
properties part number "FinalNewbaseTop"
